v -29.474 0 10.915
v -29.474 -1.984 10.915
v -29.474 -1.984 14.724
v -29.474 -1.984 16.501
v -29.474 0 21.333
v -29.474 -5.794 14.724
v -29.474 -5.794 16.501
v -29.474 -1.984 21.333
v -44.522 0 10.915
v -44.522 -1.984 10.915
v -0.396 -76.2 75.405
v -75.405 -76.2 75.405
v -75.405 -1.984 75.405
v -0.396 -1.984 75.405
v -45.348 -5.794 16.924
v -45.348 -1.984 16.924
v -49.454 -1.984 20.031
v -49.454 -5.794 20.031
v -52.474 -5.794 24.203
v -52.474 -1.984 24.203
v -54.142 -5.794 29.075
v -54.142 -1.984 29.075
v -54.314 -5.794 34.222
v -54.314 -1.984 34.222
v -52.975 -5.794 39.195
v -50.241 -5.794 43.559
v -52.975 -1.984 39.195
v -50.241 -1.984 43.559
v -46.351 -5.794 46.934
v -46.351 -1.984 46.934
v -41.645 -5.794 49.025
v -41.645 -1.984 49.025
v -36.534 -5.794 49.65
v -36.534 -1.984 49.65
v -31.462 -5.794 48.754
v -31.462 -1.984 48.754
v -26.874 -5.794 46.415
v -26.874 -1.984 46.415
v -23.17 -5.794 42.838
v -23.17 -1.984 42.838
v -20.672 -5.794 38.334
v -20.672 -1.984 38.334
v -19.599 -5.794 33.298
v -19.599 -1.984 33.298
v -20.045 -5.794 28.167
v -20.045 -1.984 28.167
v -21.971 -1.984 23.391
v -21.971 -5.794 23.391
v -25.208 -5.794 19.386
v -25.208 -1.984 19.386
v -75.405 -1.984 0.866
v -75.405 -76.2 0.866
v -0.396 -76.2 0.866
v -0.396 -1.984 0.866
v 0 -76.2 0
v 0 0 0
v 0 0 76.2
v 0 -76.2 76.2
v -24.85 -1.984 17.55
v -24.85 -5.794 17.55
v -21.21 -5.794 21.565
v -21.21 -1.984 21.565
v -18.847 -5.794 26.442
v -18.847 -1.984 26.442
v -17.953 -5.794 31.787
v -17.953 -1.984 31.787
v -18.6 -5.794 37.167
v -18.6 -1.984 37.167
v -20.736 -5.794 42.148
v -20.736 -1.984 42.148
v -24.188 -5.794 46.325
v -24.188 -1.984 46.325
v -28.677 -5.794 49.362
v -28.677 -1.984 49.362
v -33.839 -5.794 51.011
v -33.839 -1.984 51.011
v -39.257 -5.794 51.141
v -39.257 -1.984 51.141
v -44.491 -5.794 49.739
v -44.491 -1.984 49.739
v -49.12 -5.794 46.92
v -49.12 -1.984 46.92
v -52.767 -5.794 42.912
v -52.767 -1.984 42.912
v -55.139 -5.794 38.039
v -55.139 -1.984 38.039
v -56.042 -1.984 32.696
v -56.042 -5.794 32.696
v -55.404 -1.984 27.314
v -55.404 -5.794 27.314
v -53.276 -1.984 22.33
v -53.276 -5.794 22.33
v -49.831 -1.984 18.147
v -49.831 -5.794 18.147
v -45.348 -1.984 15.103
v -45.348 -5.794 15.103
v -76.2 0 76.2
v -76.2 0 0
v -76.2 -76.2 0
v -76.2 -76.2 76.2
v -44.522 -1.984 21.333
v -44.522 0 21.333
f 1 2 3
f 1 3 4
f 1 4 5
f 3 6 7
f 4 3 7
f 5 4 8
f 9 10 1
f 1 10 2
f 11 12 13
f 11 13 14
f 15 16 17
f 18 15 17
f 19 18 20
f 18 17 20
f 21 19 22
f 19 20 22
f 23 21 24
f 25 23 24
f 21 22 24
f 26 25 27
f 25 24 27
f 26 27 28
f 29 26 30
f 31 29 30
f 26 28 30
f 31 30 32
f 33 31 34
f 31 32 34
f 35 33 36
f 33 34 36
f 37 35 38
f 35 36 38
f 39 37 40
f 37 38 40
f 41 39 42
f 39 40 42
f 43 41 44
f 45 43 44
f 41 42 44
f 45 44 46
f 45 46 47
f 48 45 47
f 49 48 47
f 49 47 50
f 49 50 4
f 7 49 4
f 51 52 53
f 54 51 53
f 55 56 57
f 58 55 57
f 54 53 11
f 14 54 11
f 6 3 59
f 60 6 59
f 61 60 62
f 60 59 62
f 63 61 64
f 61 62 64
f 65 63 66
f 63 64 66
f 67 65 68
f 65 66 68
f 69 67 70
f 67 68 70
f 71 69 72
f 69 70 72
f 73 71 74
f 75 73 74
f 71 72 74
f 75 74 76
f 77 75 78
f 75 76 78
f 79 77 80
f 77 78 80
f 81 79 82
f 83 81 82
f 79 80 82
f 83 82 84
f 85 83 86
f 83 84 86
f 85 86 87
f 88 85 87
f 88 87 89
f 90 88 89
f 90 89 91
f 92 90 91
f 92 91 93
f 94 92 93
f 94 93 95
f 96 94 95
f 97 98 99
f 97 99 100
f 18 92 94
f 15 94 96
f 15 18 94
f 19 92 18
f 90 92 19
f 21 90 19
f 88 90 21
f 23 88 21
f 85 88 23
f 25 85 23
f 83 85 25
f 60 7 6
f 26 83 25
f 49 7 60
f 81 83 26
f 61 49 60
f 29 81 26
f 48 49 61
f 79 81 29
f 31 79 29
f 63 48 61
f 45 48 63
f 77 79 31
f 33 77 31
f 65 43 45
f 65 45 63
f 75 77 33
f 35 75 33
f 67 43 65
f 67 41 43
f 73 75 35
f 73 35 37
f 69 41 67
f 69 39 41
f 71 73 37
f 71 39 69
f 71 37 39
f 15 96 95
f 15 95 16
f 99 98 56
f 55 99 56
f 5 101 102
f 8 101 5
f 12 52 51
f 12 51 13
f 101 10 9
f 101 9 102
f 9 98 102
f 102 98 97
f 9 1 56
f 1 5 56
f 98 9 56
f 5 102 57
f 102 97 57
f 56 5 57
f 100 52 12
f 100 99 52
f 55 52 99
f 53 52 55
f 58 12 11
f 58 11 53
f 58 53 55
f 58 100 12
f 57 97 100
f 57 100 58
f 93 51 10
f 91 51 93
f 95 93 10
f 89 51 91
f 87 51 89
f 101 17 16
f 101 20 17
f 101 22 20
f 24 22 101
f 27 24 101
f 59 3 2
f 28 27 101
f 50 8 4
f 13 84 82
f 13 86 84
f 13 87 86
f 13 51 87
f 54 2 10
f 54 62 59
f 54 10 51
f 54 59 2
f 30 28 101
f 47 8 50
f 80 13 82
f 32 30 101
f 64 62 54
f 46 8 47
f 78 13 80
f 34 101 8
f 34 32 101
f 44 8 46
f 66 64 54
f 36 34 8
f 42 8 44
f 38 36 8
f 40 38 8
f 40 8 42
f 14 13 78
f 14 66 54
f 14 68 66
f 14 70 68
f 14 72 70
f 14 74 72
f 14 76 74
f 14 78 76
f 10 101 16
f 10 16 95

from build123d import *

# Parameters (mm, degrees)
F0_W     = 76.2
F0_H     = 76.2
F1_DEPTH = 76.2
F2_W     = 75.00874
F2_H     = 74.538709
F3_DEPTH = 74.21626
F4_W     = 15.047822
F4_H     = 10.417721
F5_DEPTH = 23.8125
F7_DEPTH = 3.81


with BuildPart() as f1:
    # F0 (on Front) → F1 (new body)
    with BuildSketch(Plane.XZ):
        with Locations((-38.1, 38.1)):
            Rectangle(F0_W, F0_H)
    extrude(amount=F1_DEPTH)

    # F2 (on face) → F3 (cut)
    with BuildSketch(Plane.XZ.offset(76.2)):
        with Locations((-37.90061, 38.135625)):
            Rectangle(F2_W, F2_H)
    extrude(amount=-F3_DEPTH, mode=Mode.SUBTRACT)

    # F4 (on face) → F5 (cut)
    with BuildSketch(Plane.XZ.offset(1.98374)):
        with Locations((-36.997689, 16.123744)):
            Rectangle(F4_W, F4_H)
    extrude(amount=-F5_DEPTH, mode=Mode.SUBTRACT)

    # F6 (on face) → F7 (join)
    with BuildSketch(Plane.XZ.offset(1.98374)):
        with BuildLine():
            Line((-29.473778, 16.500985), (-29.473778, 14.723744))
            ThreePointArc((-29.473778, 14.723744), (-36.543118, 51.269556), (-45.348023, 15.102643))
            Line((-45.348023, 15.102643), (-45.348023, 16.92383))
            ThreePointArc((-45.348023, 16.92383), (-36.53353, 49.650186), (-29.473778, 16.500985))
        make_face()
    extrude(amount=F7_DEPTH)


solid = f1.part
